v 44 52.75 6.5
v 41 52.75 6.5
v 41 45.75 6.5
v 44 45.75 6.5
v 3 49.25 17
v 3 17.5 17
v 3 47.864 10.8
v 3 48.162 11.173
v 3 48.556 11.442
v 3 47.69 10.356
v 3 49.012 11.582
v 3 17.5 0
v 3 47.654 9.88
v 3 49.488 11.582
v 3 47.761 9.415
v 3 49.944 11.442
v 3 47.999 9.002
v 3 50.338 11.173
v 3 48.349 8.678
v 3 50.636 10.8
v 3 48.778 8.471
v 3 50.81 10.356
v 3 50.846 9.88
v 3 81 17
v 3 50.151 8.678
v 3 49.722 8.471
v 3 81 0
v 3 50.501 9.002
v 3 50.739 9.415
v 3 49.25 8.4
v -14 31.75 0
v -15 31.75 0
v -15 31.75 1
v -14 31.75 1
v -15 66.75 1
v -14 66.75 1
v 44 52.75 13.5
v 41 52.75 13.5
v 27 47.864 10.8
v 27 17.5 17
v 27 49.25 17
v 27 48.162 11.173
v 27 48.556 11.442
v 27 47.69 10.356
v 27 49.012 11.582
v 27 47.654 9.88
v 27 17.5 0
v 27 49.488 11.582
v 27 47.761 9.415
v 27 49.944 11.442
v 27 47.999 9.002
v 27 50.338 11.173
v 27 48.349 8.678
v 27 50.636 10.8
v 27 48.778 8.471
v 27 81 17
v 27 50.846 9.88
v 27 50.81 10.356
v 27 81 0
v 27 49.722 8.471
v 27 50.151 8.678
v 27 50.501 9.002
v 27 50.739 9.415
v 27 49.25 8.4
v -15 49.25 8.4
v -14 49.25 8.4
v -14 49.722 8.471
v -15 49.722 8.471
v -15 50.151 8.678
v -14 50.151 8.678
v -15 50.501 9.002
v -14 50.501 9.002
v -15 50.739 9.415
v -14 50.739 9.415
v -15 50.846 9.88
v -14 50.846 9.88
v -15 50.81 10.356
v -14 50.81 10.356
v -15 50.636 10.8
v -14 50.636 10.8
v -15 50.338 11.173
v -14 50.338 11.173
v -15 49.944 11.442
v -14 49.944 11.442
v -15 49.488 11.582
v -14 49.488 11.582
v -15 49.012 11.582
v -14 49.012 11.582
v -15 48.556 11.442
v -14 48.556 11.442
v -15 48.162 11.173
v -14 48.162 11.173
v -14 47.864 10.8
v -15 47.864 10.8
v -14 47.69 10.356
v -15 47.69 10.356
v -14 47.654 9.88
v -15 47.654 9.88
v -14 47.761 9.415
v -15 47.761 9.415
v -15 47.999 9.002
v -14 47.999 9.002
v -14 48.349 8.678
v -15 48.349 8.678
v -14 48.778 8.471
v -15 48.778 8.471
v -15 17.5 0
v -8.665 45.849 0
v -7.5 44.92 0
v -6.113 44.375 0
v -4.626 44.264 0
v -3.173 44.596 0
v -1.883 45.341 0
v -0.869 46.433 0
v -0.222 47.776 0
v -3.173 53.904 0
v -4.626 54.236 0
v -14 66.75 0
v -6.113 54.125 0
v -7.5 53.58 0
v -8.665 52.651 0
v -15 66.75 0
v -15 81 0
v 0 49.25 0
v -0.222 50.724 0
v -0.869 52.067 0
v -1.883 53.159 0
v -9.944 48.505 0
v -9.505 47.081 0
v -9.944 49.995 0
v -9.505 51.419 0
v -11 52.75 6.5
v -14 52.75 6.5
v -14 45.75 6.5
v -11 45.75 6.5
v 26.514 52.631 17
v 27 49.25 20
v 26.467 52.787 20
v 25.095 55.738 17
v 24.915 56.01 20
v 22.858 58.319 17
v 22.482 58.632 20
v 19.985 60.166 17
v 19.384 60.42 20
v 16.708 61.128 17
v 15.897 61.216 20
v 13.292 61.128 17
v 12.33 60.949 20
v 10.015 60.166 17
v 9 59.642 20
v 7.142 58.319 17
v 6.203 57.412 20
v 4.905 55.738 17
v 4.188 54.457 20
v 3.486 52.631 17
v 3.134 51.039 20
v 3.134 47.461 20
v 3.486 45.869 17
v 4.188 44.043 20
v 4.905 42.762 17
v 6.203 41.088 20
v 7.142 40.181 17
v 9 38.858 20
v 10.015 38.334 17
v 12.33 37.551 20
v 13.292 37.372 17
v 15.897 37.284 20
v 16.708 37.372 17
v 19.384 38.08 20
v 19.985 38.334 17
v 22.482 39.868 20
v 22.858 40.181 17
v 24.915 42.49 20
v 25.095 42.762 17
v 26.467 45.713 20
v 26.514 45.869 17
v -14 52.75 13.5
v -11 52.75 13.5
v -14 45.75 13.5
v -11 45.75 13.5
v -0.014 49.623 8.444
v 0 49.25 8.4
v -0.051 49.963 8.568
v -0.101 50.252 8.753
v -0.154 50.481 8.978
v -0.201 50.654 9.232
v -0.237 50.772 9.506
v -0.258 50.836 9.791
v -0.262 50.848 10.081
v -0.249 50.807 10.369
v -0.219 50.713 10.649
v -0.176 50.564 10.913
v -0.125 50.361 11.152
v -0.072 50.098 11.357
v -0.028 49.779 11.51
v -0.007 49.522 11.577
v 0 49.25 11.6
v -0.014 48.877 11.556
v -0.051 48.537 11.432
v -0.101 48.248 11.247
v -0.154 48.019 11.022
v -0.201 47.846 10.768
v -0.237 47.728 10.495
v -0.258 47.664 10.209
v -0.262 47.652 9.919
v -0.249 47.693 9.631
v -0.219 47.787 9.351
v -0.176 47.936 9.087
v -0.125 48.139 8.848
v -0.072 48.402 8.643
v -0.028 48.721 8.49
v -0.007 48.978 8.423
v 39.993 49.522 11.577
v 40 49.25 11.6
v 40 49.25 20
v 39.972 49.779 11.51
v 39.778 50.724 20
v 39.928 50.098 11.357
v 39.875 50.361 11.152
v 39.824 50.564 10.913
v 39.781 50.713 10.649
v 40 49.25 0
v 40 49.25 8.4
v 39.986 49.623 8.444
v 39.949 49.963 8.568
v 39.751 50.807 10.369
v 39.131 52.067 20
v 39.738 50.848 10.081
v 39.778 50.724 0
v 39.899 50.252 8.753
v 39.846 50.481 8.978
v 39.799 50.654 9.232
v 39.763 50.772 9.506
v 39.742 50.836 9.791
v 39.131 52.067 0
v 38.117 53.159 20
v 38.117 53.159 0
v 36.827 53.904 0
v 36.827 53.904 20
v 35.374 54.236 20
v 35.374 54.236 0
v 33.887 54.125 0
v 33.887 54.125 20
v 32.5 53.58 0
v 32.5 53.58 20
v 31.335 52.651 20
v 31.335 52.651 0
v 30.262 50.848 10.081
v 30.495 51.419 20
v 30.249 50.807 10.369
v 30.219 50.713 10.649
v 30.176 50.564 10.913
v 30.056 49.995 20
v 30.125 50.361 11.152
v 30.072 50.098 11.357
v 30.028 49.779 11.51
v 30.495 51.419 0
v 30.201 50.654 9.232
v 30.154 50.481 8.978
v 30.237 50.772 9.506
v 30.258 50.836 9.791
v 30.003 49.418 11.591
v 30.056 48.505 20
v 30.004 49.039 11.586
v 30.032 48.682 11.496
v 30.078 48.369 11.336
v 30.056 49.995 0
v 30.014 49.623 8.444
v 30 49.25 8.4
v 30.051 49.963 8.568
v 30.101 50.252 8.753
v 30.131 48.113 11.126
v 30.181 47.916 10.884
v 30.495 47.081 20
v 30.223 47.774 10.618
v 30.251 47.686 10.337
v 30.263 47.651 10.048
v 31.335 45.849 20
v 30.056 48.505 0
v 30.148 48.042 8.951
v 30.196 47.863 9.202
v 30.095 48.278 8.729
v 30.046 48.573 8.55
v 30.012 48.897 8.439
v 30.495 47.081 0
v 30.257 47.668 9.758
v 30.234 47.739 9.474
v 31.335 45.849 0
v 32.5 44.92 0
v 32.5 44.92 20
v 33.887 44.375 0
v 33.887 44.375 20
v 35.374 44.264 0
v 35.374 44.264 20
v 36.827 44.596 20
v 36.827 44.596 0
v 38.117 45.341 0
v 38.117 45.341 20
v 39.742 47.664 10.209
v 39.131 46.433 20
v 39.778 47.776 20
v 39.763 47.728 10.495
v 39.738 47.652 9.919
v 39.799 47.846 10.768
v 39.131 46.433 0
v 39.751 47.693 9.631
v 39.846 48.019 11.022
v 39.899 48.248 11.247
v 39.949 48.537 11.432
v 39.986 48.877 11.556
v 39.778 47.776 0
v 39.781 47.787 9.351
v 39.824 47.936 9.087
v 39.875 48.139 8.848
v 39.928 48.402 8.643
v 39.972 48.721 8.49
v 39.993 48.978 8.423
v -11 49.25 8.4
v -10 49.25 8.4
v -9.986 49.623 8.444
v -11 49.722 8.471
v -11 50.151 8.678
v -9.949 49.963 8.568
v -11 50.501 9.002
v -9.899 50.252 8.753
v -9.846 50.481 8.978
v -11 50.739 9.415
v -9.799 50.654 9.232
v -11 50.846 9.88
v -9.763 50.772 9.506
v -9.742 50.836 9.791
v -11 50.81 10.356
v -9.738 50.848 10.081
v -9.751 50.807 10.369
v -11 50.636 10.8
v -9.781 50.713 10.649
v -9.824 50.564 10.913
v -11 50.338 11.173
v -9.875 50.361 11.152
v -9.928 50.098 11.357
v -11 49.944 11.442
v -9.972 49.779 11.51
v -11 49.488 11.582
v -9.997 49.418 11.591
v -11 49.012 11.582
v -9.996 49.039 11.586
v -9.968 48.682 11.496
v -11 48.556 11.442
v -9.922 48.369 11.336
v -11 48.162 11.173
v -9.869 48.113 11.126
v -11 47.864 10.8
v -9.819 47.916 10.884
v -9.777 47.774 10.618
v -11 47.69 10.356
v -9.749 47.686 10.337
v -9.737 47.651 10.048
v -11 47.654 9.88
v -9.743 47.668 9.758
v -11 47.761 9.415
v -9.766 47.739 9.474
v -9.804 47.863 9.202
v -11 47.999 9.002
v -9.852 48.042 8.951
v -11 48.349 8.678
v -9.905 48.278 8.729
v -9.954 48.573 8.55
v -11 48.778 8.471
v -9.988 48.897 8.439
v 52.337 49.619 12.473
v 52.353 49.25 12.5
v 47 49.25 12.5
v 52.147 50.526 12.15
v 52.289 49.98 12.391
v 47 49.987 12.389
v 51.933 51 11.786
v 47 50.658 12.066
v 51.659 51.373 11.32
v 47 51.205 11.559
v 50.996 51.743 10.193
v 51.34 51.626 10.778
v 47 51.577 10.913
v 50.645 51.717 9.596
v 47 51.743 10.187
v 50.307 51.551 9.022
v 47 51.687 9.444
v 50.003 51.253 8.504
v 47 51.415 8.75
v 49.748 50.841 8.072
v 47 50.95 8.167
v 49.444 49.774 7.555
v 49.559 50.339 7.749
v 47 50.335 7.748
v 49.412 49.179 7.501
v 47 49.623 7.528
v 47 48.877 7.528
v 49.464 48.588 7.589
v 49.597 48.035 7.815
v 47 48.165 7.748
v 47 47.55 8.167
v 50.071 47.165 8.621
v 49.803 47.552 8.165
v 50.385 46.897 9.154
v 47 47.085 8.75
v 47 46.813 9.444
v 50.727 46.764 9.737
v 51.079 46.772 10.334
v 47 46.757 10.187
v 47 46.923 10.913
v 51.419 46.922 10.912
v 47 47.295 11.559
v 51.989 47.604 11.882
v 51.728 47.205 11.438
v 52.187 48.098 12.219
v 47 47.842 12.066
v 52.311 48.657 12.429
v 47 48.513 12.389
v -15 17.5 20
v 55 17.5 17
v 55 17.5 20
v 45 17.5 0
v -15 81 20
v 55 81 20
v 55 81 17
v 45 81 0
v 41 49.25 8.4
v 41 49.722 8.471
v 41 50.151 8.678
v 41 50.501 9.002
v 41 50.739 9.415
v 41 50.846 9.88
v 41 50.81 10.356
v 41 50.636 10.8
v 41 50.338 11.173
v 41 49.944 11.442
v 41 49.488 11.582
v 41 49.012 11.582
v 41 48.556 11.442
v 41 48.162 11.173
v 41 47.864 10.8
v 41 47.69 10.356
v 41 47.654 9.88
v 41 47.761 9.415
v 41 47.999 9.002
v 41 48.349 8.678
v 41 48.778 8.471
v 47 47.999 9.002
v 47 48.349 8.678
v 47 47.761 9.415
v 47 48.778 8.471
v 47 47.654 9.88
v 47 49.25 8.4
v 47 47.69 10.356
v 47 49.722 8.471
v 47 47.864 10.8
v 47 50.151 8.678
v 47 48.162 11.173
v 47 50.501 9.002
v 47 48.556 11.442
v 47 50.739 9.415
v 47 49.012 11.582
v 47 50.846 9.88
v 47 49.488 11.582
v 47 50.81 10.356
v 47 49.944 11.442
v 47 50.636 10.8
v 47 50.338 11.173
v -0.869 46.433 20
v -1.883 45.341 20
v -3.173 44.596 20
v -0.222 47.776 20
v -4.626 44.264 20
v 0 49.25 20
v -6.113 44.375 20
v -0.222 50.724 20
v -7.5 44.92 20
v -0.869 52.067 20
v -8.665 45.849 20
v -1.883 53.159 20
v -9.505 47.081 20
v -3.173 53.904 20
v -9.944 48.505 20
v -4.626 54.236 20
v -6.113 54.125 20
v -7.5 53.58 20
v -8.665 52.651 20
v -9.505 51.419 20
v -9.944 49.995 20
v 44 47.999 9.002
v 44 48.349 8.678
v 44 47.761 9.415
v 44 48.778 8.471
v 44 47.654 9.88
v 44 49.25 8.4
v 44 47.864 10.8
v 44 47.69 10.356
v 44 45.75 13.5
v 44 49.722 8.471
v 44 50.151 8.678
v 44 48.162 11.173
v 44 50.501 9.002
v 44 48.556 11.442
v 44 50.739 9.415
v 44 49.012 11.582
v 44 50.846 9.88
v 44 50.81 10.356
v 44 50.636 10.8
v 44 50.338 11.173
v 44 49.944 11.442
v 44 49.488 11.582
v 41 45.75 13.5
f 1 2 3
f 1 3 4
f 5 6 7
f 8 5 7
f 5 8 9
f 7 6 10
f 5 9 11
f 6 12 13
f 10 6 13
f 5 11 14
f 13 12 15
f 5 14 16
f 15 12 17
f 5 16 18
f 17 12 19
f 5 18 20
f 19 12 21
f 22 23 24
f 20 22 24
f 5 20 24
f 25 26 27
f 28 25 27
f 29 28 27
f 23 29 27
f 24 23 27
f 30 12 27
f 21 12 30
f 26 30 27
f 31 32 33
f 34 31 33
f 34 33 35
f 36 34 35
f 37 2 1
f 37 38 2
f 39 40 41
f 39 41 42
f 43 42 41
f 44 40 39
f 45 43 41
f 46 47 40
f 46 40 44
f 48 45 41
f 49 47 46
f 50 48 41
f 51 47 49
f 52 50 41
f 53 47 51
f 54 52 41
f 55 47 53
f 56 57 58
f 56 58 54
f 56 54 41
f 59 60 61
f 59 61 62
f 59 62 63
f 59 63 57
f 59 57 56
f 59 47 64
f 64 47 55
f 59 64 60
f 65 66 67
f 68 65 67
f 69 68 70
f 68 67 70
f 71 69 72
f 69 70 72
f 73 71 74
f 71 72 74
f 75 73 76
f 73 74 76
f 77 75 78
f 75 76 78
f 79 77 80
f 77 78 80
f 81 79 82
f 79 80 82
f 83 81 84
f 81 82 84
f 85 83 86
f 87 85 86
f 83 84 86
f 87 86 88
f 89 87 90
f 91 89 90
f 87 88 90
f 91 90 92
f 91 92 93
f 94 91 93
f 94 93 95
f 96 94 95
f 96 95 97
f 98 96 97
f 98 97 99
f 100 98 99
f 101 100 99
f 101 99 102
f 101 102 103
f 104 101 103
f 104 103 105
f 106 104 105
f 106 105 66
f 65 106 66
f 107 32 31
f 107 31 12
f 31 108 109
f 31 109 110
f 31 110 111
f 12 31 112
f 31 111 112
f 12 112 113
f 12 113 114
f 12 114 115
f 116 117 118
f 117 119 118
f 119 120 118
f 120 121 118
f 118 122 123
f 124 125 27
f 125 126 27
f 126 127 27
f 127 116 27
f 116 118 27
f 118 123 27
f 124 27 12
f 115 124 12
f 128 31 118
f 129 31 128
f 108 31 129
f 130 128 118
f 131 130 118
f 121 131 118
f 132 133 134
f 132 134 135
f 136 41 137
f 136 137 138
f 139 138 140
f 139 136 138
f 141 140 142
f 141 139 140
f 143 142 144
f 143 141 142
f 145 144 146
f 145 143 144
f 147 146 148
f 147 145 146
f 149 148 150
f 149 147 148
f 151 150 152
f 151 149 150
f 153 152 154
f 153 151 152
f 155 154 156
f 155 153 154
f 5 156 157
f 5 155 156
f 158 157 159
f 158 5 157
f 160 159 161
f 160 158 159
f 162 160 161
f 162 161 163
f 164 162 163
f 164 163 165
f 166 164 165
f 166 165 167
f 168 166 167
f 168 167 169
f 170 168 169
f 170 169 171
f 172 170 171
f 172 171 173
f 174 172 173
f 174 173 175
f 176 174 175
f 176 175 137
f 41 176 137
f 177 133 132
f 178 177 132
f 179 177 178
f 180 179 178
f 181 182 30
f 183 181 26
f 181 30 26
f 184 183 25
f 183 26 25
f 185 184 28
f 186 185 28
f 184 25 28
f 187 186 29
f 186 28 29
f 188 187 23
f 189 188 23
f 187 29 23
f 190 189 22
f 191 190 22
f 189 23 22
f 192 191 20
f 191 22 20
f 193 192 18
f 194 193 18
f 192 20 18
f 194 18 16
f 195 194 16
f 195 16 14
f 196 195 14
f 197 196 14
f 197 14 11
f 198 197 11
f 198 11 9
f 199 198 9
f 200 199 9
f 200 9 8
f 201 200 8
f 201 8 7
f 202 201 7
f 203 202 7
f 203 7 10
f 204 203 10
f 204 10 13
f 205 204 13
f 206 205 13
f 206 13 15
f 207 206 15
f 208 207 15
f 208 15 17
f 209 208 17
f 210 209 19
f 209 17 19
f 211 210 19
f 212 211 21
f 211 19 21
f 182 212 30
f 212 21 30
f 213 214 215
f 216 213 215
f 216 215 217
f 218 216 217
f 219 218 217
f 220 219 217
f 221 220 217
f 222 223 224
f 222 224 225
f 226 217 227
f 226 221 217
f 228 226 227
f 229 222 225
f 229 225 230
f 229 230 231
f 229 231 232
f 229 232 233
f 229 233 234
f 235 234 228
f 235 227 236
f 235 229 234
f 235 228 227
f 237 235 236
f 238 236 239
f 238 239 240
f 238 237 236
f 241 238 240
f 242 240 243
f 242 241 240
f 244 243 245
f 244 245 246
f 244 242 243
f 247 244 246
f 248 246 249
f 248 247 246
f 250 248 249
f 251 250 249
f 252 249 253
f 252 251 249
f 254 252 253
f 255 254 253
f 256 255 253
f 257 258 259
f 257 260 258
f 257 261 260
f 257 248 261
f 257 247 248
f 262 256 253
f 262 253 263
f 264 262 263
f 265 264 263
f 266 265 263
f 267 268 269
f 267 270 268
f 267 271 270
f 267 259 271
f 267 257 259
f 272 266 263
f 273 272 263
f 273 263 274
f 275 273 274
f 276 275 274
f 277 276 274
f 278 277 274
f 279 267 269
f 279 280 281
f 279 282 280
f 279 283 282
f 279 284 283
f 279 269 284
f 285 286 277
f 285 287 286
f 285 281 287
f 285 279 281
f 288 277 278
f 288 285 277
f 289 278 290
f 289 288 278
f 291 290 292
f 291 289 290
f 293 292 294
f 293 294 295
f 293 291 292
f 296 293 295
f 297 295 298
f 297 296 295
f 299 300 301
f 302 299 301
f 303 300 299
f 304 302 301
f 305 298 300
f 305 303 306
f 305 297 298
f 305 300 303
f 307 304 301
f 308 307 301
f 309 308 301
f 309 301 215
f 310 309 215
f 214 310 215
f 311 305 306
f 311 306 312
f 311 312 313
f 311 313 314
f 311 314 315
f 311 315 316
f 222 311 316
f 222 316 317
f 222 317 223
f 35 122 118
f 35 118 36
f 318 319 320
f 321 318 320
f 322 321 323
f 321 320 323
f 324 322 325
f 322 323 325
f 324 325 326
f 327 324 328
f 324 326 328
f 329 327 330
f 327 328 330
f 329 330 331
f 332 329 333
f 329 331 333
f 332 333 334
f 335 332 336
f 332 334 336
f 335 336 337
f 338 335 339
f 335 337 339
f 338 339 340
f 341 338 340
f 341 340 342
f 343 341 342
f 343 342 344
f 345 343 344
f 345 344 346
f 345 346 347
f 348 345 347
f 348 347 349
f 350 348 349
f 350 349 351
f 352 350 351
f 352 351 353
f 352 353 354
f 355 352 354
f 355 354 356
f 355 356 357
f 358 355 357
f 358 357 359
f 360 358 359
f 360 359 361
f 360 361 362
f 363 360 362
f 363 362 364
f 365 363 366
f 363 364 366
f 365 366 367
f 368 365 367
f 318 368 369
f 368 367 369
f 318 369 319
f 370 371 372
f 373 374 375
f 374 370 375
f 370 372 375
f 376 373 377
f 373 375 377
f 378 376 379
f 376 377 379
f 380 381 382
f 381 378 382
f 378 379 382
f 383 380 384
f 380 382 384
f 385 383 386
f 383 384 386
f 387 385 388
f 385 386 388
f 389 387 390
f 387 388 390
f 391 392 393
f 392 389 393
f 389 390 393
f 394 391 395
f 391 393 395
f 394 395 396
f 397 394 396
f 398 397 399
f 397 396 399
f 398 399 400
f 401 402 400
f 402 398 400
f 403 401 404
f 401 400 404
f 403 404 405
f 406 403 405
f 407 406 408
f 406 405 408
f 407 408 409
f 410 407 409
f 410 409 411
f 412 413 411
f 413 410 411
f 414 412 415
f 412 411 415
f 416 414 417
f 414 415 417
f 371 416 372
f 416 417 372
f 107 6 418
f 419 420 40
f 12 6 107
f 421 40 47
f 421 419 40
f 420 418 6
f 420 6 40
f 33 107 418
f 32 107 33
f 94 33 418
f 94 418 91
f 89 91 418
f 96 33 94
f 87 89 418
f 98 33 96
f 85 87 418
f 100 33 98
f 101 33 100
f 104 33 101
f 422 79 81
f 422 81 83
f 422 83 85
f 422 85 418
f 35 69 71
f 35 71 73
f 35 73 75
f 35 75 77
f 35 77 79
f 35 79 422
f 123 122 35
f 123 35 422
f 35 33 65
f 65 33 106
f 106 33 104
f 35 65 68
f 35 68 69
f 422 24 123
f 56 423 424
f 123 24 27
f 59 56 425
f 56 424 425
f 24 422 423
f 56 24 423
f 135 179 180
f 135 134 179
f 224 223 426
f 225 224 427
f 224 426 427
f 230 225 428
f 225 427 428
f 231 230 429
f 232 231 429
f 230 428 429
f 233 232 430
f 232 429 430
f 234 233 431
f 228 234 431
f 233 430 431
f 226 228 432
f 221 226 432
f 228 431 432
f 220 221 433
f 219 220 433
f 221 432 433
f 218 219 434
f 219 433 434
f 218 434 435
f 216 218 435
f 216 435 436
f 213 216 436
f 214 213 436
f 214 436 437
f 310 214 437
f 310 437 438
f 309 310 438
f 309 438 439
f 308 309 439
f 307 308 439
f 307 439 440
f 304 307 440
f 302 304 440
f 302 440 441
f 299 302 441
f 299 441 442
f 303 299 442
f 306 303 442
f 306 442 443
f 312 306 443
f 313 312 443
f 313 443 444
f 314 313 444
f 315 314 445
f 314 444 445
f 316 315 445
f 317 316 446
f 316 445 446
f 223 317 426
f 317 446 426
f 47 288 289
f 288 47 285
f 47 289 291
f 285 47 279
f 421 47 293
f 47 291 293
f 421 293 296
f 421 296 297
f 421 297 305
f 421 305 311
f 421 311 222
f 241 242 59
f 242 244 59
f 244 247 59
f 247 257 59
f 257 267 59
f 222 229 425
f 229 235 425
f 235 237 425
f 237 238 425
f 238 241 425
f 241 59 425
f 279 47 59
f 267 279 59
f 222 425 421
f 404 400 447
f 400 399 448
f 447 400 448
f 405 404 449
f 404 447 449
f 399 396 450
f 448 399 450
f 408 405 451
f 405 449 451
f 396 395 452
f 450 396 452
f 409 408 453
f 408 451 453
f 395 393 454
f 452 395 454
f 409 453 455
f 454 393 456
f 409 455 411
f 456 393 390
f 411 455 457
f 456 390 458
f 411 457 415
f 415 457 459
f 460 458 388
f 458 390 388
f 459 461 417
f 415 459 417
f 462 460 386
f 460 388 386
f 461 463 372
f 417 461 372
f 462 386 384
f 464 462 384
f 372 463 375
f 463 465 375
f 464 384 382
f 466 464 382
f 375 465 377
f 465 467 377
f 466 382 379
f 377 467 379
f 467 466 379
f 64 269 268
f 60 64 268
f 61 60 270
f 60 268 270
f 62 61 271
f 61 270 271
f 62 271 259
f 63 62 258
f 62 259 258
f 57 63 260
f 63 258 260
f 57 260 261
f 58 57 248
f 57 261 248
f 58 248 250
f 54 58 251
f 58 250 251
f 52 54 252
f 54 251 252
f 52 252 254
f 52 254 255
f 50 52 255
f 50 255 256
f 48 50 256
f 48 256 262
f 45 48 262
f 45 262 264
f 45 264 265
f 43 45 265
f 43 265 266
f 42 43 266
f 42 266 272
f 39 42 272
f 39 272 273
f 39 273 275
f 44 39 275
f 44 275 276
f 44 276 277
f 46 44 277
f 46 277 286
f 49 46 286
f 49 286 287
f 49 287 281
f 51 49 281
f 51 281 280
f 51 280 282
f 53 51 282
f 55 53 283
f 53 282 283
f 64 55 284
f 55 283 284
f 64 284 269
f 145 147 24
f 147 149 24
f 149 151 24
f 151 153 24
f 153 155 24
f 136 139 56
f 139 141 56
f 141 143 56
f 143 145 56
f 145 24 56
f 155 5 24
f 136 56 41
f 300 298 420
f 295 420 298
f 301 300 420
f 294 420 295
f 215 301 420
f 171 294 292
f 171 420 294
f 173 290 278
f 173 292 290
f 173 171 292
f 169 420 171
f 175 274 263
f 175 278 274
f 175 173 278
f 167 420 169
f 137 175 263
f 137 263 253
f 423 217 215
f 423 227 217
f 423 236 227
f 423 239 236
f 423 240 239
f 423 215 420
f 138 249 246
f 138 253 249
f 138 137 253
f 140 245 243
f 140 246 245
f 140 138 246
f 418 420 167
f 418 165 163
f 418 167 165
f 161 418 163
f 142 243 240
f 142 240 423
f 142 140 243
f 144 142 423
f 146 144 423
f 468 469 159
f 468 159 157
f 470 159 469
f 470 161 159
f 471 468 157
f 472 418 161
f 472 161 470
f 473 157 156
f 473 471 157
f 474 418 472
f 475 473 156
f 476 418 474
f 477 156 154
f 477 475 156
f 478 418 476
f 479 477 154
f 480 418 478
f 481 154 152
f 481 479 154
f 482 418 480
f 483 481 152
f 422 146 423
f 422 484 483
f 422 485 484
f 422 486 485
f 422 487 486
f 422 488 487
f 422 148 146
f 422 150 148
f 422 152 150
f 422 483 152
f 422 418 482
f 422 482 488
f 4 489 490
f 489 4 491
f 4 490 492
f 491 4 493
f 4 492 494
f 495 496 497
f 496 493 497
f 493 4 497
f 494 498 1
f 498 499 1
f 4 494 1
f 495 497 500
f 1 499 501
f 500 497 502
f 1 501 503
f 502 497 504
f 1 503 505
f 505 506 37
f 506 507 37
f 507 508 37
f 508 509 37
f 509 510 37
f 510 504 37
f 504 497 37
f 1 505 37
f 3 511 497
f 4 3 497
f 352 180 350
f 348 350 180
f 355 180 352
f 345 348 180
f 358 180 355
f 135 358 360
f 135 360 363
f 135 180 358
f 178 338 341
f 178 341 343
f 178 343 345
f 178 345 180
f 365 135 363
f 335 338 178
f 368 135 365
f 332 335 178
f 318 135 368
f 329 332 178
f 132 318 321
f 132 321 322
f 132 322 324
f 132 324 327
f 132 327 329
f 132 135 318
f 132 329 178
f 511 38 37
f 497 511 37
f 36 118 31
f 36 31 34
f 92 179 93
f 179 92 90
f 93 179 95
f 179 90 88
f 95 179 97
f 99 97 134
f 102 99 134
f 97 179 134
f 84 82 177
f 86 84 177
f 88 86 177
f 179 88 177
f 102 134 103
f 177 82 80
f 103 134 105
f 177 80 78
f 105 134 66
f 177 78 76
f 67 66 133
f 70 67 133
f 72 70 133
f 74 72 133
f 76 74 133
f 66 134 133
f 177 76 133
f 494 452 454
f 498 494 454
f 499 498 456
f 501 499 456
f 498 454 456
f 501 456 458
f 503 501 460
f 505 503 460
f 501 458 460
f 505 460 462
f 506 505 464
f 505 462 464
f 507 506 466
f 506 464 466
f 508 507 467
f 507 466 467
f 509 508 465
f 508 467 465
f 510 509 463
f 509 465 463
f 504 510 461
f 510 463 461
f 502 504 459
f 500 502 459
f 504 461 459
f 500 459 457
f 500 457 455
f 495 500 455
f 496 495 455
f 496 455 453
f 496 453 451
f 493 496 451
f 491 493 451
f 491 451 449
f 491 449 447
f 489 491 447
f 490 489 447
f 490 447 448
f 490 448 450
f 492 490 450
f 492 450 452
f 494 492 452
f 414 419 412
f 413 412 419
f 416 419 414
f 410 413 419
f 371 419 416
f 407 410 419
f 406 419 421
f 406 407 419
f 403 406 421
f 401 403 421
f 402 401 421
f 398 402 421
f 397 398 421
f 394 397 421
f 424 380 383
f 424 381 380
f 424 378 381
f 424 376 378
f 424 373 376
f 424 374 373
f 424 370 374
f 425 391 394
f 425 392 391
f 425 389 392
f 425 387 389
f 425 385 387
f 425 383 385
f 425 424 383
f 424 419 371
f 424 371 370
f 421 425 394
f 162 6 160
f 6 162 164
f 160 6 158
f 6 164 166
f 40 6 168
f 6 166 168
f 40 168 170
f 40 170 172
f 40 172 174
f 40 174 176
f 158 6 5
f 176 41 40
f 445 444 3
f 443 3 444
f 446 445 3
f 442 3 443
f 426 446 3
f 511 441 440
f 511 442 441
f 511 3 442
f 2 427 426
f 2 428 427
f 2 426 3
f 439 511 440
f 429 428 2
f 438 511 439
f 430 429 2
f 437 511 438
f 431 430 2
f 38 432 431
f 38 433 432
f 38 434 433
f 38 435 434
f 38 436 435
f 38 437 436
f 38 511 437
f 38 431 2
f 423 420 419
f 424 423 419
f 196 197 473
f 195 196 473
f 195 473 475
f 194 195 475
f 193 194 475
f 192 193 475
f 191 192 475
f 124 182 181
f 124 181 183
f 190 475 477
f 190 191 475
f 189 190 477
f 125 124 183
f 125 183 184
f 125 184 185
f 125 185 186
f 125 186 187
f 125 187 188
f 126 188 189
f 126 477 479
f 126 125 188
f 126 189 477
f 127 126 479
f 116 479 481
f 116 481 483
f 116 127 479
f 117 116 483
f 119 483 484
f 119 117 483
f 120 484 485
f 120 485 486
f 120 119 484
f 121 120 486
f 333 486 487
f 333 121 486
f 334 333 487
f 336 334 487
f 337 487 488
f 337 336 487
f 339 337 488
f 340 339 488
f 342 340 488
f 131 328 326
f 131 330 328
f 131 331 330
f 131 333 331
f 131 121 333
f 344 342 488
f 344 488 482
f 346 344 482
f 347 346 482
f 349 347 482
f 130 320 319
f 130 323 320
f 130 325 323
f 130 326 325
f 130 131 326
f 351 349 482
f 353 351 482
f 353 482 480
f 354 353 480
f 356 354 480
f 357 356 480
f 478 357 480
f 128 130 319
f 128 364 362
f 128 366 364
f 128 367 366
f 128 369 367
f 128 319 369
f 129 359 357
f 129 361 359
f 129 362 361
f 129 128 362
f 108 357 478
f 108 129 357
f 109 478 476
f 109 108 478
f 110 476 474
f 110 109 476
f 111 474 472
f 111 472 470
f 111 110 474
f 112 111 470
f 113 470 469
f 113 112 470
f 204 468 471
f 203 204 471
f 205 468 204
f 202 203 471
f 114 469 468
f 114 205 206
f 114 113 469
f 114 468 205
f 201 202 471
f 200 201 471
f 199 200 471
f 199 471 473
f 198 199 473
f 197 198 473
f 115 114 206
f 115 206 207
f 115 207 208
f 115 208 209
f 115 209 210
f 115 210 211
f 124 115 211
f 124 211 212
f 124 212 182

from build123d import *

# Parameters (mm, degrees)
SKETCH_1_W          = 18
SKETCH_1_H          = 63.5
SKETCH_1_R          = 5
EXTRUDE_1_DEPTH     = 17
EXTRUDE_1_2_DEPTH   = 17
SKETCH_2_W          = 60
SKETCH_2_H          = 63.5
SKETCH_2_R          = 5
SKETCH_2_R_2        = 12
EXTRUDE_2_DEPTH     = 3
SKETCH_3_W          = 3
SKETCH_3_H          = 63.5
EXTRUDE_3_DEPTH     = 10
RIB_1_REACH         = 88.355
SKETCH_4_WALL_W     = 194.433823758
SKETCH_4_WALL_H     = 63.5
SKETCH_7_W          = 3
SKETCH_7_H          = 7
CUT_EXTRUDE_1_DEPTH = 3.5
HOLE_WIZARD_1_D     = 3.2
SKETCH_13_R         = 2.5
CUT_EXTRUDE_2_DEPTH = 11
SKETCH_14_W         = 2
SKETCH_14_H         = 35
CUT_EXTRUDE_3_DEPTH = 1


with BuildPart() as part:
    # 草图1 → 凸台-拉伸1 (new body)
    with BuildSketch(Plane.XY):
        with Locations((36, 49.25)):
            Rectangle(SKETCH_1_W, SKETCH_1_H)
        with Locations((35, 49.25)):
            Circle(SKETCH_1_R, mode=Mode.SUBTRACT)
    extrude(amount=EXTRUDE_1_DEPTH)



with BuildPart() as body_2:
    # 草图1 → Extrude 1 2 (new body)
    with BuildSketch(Plane.XY):
        with Locations((-6, 49.25)):
            Rectangle(SKETCH_1_W, SKETCH_1_H)
        with Locations((-5, 49.25)):
            Circle(SKETCH_1_R, mode=Mode.SUBTRACT)
    extrude(amount=EXTRUDE_1_2_DEPTH)


with BuildPart() as part_1:
    add(part.part)

    add(body_2.part)  # 凸台-拉伸2 merges body 2
    # 草图2 → 凸台-拉伸2 (add)
    with BuildSketch(Plane.XY.offset(17)):
        with Locations((15, 49.25)):
            Rectangle(SKETCH_2_W, SKETCH_2_H)
        with Locations((35, 49.25)):
            Circle(SKETCH_2_R, mode=Mode.SUBTRACT)
        with Locations((-5, 49.25)):
            Circle(SKETCH_2_R, mode=Mode.SUBTRACT)
        with Locations((15, 49.25)):
            Circle(SKETCH_2_R_2, mode=Mode.SUBTRACT)
    extrude(amount=EXTRUDE_2_DEPTH)

    # 草图3 → 凸台-拉伸3 (add)
    with BuildSketch(Plane(origin=(45, 0, 0), x_dir=(0, 0, -1), z_dir=(1, 0, 0))):
        with Locations((-18.5, 49.25)):
            Rectangle(SKETCH_3_W, SKETCH_3_H)
    extrude(amount=EXTRUDE_3_DEPTH)

    # 草图4 wall → 筋1 (add, up to next)
    with BuildSketch(Plane(origin=(50, 17.5, 8.5), x_dir=(-0.507020126563, 0, -0.861934215158), z_dir=(0.861934215158, 0, -0.507020126563)), mode=Mode.PRIVATE) as rib_1_sk1:
        with Locations((0, 31.75)):
            Rectangle(SKETCH_4_WALL_W, SKETCH_4_WALL_H)
    rib_1_tool1 = extrude(rib_1_sk1.sketch, amount=-RIB_1_REACH, mode=Mode.PRIVATE) - part_1.part
    add(rib_1_tool1.solids().sort_by_distance((50, 17.5, 8.5))[0])

    # 草图7 → 切除-拉伸1 (cut, symmetric)
    with BuildSketch(Plane.XY.offset(10)):
        with Locations((-12.5, 49.25)):
            Rectangle(SKETCH_7_W, SKETCH_7_H)
        with Locations((42.5, 49.25)):
            Rectangle(SKETCH_7_W, SKETCH_7_H)
    extrude(amount=CUT_EXTRUDE_1_DEPTH, both=True, mode=Mode.SUBTRACT)

    # 孔1 (through all)
    with Locations(Plane.ZY.offset(15)):
        with Locations((10, 49.25)):
            Hole(HOLE_WIZARD_1_D / 2)

    # 草图13 → 切除-拉伸2 (cut)
    with BuildSketch(Plane.ZY.offset(-47)):
        with Locations((10, 49.25)):
            Circle(SKETCH_13_R)
    extrude(amount=-CUT_EXTRUDE_2_DEPTH, mode=Mode.SUBTRACT)

    # 草图14 → 切除-拉伸3 (cut)
    with BuildSketch(Plane.ZY.offset(15)):
        with Locations((0, 49.25)):
            Rectangle(SKETCH_14_W, SKETCH_14_H)
    extrude(amount=-CUT_EXTRUDE_3_DEPTH, mode=Mode.SUBTRACT)


solid = part_1.part
